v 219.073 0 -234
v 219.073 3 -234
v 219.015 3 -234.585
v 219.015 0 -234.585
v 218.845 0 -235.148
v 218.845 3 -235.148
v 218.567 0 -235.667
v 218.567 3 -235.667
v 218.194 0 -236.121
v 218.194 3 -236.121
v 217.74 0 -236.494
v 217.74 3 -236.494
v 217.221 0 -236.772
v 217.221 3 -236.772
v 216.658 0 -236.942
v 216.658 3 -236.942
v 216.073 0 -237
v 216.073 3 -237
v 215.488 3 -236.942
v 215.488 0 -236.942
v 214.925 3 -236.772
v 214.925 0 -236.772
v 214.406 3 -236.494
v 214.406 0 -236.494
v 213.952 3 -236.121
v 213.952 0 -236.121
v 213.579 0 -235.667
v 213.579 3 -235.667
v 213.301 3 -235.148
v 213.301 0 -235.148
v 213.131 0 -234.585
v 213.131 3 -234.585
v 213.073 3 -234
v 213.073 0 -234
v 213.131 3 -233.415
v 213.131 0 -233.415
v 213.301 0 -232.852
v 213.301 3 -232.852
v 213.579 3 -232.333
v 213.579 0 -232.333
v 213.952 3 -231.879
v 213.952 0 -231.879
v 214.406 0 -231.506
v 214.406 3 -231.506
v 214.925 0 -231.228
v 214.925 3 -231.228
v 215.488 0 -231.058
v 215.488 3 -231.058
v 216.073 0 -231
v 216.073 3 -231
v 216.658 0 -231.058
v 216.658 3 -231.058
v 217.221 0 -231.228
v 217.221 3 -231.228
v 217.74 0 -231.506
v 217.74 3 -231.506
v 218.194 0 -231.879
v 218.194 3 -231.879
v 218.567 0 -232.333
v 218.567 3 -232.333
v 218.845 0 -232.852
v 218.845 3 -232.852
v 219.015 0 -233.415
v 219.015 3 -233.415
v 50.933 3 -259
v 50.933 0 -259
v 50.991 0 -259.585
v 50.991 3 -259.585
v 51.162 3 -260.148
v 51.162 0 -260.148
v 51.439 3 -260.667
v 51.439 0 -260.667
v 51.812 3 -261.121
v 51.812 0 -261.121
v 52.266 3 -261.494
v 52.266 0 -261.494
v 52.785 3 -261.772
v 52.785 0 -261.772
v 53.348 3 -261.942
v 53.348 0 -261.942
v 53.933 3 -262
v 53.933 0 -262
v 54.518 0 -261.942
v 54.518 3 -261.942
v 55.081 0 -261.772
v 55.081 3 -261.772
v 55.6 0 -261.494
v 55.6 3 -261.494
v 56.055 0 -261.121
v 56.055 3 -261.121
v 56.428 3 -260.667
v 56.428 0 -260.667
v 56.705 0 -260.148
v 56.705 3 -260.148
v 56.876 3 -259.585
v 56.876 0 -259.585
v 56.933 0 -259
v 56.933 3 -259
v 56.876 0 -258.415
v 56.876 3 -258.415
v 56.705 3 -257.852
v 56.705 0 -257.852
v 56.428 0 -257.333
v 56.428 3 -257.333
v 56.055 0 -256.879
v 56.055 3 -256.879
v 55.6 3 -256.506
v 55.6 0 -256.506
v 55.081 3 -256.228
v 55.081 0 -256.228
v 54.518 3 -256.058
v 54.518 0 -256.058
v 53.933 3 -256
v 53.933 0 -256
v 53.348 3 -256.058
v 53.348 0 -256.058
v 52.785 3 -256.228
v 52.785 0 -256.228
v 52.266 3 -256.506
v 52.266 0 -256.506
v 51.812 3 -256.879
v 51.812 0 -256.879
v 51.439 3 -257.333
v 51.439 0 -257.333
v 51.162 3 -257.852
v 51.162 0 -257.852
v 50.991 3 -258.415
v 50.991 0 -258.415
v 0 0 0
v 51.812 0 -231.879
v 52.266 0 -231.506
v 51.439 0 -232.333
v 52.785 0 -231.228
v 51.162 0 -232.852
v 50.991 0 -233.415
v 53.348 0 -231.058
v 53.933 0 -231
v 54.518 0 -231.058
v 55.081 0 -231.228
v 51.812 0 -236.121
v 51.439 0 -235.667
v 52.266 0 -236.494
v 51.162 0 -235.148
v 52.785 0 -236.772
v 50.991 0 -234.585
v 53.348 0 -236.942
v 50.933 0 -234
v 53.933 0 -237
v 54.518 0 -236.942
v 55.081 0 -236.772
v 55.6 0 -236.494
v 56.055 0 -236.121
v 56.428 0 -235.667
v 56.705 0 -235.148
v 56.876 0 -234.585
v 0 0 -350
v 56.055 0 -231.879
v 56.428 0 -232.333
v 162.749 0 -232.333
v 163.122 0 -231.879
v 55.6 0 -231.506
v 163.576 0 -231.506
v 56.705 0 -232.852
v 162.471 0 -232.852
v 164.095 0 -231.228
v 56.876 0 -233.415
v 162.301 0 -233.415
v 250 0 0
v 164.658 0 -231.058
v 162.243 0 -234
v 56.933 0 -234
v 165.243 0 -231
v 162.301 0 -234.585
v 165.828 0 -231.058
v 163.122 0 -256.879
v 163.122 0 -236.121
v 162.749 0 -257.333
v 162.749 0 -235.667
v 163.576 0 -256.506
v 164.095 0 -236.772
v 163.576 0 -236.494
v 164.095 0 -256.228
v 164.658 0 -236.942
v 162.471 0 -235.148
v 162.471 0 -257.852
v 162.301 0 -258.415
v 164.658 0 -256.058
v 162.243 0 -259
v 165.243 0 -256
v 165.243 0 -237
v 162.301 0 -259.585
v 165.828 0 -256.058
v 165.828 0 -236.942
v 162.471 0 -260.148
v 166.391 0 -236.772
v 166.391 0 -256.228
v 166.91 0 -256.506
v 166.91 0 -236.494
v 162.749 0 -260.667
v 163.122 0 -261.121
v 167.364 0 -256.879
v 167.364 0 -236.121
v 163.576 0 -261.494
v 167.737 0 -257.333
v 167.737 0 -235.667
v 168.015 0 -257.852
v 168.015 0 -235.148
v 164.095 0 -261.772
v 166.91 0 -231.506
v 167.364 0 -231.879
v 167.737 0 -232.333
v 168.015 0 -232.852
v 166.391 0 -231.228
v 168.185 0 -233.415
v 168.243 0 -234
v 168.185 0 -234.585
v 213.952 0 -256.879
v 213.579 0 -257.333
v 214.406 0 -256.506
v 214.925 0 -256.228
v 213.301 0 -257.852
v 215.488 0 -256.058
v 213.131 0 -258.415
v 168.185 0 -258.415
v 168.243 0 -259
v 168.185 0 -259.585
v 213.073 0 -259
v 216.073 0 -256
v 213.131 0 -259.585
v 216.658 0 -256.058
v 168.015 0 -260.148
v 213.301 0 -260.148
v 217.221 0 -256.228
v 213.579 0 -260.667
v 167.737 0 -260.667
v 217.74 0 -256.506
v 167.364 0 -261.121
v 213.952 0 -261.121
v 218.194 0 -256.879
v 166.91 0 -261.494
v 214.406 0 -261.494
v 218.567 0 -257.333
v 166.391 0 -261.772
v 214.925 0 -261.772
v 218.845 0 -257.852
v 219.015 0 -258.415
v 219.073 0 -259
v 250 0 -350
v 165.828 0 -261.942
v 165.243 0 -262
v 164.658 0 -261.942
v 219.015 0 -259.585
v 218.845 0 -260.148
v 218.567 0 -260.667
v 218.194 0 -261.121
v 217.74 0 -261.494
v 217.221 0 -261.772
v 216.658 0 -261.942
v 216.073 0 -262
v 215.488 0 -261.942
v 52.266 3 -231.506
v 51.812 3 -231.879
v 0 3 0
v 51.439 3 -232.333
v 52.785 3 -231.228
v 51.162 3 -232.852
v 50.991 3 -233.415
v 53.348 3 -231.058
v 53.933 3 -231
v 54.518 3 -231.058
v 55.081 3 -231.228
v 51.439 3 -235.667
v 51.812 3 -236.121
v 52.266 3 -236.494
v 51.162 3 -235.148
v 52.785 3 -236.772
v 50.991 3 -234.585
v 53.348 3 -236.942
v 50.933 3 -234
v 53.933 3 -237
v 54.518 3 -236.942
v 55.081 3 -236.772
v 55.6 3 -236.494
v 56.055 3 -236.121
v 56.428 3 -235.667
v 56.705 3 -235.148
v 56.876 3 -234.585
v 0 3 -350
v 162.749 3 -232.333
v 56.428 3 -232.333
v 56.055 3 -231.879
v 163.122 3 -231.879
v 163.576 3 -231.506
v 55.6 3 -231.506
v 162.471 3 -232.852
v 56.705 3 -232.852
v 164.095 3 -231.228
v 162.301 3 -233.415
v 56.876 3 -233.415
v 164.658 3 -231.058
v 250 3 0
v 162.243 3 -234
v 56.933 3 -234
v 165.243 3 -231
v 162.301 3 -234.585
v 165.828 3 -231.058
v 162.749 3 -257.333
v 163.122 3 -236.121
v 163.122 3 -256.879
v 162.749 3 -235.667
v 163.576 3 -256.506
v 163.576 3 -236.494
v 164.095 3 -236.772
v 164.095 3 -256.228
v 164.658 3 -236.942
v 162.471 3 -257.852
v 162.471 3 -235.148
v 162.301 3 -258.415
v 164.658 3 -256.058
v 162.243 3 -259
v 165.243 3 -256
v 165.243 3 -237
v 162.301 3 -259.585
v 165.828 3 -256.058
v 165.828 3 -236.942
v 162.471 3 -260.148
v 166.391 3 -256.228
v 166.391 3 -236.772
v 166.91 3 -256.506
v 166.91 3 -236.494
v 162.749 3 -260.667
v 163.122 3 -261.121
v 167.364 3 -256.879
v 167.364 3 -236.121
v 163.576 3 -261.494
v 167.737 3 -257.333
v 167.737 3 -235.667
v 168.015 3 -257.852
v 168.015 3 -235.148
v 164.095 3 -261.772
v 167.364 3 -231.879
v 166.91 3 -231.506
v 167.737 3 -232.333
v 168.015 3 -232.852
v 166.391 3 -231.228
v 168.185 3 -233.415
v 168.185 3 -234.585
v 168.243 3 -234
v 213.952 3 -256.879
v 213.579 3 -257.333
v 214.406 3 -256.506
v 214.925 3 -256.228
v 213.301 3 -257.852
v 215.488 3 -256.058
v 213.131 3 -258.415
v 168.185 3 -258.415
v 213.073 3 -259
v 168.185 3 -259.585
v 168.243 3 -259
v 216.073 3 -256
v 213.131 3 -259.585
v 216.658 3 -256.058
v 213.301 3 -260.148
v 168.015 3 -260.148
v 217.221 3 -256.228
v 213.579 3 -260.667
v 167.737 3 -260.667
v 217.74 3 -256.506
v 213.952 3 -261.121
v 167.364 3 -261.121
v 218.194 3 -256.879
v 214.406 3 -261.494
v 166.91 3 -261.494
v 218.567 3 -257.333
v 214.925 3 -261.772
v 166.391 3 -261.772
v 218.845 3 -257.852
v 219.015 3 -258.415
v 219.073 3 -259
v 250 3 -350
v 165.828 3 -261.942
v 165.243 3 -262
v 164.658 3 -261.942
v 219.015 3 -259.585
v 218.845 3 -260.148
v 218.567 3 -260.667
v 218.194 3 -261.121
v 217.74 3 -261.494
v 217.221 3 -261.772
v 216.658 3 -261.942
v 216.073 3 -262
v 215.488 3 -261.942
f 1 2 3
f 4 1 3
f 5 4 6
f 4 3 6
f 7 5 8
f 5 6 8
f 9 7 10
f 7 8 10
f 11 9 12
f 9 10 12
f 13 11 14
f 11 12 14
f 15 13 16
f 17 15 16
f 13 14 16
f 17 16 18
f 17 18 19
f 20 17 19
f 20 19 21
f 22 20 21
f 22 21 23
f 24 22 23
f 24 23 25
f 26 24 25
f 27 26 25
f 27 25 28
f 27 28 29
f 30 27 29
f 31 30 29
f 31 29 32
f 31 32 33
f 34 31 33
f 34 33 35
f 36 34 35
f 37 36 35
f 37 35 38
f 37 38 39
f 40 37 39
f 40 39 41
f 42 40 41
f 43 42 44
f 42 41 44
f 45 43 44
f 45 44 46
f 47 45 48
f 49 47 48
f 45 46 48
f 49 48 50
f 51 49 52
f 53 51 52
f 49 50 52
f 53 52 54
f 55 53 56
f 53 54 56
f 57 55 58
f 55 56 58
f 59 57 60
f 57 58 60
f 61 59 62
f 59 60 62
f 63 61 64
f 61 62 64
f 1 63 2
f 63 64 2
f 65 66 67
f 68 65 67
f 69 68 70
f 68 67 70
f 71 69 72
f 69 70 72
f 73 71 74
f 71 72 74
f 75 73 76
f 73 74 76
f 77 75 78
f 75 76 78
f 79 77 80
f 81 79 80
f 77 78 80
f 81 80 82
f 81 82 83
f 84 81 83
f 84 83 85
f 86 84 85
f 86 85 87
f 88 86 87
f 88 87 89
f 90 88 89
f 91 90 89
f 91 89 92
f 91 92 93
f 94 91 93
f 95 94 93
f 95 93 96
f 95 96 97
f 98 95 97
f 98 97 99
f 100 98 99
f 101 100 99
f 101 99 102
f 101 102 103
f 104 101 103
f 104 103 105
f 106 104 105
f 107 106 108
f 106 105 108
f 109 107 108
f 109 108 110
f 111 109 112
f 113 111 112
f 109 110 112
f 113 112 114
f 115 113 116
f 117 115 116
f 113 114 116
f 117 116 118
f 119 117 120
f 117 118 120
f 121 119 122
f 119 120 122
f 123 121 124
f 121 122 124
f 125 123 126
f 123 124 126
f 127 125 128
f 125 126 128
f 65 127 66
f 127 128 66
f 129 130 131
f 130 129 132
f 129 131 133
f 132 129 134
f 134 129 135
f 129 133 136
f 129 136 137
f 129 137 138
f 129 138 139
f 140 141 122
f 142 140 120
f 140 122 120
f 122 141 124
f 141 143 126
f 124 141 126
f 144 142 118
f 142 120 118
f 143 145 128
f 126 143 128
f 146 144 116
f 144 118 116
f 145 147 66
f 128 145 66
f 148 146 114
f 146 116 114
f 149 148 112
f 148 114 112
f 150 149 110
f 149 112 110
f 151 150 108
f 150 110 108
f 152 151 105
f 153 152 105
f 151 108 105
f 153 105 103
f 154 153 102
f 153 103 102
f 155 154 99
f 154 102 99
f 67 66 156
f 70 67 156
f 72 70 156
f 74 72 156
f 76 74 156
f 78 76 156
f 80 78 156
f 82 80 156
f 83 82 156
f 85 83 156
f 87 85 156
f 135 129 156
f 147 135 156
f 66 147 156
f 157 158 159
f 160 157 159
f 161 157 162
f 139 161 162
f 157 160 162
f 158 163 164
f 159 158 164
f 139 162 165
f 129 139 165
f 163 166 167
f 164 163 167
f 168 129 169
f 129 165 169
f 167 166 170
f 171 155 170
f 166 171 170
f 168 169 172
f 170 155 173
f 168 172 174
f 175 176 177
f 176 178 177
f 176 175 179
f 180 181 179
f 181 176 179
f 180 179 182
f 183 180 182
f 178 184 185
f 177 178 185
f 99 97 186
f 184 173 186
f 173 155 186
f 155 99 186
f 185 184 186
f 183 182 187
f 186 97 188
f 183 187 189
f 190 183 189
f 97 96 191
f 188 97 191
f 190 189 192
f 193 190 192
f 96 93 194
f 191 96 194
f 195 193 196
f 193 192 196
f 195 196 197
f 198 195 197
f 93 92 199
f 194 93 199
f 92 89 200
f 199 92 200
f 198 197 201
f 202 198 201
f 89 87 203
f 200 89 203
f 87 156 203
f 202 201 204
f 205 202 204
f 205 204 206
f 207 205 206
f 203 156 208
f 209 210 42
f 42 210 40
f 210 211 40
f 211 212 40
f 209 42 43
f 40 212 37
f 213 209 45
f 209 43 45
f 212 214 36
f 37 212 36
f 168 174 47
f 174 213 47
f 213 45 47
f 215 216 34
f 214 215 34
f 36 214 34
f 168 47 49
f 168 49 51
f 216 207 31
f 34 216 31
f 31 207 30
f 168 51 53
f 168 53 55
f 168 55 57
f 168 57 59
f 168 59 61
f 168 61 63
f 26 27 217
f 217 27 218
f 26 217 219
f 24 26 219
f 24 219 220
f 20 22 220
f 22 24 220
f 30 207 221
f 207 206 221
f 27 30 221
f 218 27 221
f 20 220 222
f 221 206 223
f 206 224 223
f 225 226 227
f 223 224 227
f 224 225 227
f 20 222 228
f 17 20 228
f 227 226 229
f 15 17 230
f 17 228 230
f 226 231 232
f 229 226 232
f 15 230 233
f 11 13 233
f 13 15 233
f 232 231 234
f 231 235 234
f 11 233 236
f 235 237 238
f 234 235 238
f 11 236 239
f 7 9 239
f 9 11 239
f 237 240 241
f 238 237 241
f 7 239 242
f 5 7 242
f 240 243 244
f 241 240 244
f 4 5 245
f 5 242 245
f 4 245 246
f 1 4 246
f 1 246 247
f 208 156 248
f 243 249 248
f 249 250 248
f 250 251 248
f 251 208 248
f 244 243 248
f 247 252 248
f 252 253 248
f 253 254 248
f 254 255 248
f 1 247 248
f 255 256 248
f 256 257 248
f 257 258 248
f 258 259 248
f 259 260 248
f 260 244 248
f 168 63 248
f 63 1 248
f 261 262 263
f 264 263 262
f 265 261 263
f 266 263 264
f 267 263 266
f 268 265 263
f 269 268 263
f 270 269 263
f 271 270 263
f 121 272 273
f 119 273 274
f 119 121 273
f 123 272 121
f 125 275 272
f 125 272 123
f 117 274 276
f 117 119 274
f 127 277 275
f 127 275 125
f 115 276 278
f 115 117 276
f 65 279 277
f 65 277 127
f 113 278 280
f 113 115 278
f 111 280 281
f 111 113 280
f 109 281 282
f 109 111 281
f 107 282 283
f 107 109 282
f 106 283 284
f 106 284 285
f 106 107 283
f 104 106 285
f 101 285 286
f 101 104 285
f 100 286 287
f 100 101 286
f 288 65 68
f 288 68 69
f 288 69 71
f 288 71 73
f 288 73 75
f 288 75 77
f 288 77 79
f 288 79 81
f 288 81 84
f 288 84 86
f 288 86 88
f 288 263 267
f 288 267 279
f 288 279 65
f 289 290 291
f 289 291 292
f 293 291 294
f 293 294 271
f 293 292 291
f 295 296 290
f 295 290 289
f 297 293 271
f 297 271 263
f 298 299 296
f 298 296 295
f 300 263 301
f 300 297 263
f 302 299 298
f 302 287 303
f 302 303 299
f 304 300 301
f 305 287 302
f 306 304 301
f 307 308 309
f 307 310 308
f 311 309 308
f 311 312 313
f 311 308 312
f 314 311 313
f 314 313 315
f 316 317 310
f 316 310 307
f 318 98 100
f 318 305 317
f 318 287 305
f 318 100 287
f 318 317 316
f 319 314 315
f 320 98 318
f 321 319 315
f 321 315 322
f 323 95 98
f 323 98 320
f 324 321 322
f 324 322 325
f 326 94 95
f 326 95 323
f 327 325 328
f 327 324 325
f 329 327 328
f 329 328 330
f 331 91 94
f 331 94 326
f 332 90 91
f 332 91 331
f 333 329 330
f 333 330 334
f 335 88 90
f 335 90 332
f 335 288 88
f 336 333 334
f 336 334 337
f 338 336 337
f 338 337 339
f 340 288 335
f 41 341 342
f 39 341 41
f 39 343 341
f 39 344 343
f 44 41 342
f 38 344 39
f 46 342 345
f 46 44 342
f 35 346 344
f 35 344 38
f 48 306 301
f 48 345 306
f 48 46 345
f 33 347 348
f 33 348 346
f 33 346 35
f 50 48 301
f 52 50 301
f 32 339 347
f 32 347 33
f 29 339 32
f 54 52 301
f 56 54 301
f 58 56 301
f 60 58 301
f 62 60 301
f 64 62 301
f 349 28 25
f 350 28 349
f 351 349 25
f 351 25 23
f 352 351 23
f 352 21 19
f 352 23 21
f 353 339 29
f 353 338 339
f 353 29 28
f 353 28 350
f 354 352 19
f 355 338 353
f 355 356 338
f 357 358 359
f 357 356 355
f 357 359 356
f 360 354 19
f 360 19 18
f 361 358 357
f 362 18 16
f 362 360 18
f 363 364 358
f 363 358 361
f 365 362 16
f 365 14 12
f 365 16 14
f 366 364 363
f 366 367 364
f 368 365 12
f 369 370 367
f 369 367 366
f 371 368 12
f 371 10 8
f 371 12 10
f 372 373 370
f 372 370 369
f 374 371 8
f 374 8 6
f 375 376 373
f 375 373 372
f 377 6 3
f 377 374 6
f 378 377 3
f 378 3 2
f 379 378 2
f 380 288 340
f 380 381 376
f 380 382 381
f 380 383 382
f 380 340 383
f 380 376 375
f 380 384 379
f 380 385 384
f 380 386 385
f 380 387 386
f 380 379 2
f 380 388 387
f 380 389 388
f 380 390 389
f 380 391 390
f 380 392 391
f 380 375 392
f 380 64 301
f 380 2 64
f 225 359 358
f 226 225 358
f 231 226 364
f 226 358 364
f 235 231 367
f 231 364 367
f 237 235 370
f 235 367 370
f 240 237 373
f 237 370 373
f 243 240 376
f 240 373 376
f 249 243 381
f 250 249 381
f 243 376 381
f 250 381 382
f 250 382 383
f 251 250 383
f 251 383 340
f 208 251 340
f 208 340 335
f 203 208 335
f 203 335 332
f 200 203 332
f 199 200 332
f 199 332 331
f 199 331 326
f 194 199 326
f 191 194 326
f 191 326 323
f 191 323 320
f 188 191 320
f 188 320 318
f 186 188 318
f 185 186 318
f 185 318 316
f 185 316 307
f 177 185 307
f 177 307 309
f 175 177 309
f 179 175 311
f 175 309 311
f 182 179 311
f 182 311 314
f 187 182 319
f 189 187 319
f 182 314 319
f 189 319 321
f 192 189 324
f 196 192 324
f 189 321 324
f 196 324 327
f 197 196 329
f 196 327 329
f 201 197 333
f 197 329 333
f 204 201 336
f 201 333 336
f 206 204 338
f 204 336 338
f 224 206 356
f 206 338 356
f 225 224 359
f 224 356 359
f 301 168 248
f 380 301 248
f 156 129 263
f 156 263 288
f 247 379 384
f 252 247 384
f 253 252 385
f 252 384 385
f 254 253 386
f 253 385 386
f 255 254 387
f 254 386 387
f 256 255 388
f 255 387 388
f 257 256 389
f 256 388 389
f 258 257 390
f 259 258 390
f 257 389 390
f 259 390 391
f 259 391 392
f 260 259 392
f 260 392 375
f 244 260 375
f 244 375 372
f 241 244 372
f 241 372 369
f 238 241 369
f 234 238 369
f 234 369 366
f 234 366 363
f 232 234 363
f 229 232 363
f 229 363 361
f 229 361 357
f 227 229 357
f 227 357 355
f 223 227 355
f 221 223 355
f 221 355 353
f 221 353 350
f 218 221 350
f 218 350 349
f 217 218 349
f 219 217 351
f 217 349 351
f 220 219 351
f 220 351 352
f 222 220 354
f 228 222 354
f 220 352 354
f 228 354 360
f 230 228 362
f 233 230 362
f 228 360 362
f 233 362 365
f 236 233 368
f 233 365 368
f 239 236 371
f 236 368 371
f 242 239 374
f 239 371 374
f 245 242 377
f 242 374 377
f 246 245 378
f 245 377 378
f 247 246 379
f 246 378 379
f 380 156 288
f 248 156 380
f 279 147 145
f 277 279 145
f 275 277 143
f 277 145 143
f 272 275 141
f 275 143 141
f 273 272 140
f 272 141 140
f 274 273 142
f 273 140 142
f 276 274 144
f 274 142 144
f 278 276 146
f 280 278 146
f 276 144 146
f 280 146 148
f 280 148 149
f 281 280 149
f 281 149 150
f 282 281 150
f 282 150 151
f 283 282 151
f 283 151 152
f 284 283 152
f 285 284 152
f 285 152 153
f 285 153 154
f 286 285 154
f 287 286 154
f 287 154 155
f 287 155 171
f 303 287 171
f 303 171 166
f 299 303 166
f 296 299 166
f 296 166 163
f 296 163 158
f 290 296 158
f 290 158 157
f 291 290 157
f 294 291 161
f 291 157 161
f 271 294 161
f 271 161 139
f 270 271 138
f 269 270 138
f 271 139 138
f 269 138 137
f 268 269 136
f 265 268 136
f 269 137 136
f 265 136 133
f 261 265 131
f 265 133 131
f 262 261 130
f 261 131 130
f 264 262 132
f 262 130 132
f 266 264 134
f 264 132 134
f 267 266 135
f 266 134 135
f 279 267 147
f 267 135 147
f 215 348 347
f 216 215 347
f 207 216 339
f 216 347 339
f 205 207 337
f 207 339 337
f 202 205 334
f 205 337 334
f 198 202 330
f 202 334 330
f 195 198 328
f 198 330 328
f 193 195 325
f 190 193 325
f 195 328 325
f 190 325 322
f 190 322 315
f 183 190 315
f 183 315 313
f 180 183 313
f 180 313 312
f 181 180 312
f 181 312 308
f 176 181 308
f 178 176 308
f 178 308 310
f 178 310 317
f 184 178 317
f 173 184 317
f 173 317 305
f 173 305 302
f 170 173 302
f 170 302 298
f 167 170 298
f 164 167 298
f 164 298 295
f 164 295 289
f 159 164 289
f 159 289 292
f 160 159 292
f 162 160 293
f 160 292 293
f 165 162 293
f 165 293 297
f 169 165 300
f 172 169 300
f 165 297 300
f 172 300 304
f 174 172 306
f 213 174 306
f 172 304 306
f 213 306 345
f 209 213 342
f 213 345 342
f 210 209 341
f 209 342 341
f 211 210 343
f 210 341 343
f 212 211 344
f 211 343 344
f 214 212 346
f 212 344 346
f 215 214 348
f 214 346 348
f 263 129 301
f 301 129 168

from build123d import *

# Parameters (mm, degrees)
SKETCH2_W                 = 250
SKETCH2_H                 = 350
BOSS_EXTRUDE1_DEPTH       = 3
F_6_0MM_DOWEL_HOLE3_D     = 6
F_6_0MM_DOWEL_HOLE3_DEPTH = 3
F_6_0MM_DOWEL_HOLE4_D     = 6
F_6_0MM_DOWEL_HOLE4_DEPTH = 3


with BuildPart() as part:
    # Sketch2 → Boss-Extrude1 (new body)
    with BuildSketch(Plane(origin=(0, 0, 0), x_dir=(1, 0, 0), z_dir=(0, 1, 0))):
        with Locations((125, 175)):
            Rectangle(SKETCH2_W, SKETCH2_H)
    extrude(amount=BOSS_EXTRUDE1_DEPTH)

    # Ø6.0mm Dowel Hole3
    with Locations(Plane(origin=(0, 0, 0), x_dir=(-1, 0, 0), z_dir=(0, -1, 0))):
        with Locations((-165.242917031, 259), (-216.072996176, 259), (-216.072996176, 234), (-165.242917031, 234)):
            Hole(F_6_0MM_DOWEL_HOLE3_D / 2, depth=F_6_0MM_DOWEL_HOLE3_DEPTH)

    # Ø6.0mm Dowel Hole4
    with Locations(Plane(origin=(0, 3, 0), x_dir=(1, 0, 0), z_dir=(0, 1, 0))):
        with Locations((53.933204471, 259), (53.933204471, 234)):
            Hole(F_6_0MM_DOWEL_HOLE4_D / 2, depth=F_6_0MM_DOWEL_HOLE4_DEPTH)


solid = part.part
